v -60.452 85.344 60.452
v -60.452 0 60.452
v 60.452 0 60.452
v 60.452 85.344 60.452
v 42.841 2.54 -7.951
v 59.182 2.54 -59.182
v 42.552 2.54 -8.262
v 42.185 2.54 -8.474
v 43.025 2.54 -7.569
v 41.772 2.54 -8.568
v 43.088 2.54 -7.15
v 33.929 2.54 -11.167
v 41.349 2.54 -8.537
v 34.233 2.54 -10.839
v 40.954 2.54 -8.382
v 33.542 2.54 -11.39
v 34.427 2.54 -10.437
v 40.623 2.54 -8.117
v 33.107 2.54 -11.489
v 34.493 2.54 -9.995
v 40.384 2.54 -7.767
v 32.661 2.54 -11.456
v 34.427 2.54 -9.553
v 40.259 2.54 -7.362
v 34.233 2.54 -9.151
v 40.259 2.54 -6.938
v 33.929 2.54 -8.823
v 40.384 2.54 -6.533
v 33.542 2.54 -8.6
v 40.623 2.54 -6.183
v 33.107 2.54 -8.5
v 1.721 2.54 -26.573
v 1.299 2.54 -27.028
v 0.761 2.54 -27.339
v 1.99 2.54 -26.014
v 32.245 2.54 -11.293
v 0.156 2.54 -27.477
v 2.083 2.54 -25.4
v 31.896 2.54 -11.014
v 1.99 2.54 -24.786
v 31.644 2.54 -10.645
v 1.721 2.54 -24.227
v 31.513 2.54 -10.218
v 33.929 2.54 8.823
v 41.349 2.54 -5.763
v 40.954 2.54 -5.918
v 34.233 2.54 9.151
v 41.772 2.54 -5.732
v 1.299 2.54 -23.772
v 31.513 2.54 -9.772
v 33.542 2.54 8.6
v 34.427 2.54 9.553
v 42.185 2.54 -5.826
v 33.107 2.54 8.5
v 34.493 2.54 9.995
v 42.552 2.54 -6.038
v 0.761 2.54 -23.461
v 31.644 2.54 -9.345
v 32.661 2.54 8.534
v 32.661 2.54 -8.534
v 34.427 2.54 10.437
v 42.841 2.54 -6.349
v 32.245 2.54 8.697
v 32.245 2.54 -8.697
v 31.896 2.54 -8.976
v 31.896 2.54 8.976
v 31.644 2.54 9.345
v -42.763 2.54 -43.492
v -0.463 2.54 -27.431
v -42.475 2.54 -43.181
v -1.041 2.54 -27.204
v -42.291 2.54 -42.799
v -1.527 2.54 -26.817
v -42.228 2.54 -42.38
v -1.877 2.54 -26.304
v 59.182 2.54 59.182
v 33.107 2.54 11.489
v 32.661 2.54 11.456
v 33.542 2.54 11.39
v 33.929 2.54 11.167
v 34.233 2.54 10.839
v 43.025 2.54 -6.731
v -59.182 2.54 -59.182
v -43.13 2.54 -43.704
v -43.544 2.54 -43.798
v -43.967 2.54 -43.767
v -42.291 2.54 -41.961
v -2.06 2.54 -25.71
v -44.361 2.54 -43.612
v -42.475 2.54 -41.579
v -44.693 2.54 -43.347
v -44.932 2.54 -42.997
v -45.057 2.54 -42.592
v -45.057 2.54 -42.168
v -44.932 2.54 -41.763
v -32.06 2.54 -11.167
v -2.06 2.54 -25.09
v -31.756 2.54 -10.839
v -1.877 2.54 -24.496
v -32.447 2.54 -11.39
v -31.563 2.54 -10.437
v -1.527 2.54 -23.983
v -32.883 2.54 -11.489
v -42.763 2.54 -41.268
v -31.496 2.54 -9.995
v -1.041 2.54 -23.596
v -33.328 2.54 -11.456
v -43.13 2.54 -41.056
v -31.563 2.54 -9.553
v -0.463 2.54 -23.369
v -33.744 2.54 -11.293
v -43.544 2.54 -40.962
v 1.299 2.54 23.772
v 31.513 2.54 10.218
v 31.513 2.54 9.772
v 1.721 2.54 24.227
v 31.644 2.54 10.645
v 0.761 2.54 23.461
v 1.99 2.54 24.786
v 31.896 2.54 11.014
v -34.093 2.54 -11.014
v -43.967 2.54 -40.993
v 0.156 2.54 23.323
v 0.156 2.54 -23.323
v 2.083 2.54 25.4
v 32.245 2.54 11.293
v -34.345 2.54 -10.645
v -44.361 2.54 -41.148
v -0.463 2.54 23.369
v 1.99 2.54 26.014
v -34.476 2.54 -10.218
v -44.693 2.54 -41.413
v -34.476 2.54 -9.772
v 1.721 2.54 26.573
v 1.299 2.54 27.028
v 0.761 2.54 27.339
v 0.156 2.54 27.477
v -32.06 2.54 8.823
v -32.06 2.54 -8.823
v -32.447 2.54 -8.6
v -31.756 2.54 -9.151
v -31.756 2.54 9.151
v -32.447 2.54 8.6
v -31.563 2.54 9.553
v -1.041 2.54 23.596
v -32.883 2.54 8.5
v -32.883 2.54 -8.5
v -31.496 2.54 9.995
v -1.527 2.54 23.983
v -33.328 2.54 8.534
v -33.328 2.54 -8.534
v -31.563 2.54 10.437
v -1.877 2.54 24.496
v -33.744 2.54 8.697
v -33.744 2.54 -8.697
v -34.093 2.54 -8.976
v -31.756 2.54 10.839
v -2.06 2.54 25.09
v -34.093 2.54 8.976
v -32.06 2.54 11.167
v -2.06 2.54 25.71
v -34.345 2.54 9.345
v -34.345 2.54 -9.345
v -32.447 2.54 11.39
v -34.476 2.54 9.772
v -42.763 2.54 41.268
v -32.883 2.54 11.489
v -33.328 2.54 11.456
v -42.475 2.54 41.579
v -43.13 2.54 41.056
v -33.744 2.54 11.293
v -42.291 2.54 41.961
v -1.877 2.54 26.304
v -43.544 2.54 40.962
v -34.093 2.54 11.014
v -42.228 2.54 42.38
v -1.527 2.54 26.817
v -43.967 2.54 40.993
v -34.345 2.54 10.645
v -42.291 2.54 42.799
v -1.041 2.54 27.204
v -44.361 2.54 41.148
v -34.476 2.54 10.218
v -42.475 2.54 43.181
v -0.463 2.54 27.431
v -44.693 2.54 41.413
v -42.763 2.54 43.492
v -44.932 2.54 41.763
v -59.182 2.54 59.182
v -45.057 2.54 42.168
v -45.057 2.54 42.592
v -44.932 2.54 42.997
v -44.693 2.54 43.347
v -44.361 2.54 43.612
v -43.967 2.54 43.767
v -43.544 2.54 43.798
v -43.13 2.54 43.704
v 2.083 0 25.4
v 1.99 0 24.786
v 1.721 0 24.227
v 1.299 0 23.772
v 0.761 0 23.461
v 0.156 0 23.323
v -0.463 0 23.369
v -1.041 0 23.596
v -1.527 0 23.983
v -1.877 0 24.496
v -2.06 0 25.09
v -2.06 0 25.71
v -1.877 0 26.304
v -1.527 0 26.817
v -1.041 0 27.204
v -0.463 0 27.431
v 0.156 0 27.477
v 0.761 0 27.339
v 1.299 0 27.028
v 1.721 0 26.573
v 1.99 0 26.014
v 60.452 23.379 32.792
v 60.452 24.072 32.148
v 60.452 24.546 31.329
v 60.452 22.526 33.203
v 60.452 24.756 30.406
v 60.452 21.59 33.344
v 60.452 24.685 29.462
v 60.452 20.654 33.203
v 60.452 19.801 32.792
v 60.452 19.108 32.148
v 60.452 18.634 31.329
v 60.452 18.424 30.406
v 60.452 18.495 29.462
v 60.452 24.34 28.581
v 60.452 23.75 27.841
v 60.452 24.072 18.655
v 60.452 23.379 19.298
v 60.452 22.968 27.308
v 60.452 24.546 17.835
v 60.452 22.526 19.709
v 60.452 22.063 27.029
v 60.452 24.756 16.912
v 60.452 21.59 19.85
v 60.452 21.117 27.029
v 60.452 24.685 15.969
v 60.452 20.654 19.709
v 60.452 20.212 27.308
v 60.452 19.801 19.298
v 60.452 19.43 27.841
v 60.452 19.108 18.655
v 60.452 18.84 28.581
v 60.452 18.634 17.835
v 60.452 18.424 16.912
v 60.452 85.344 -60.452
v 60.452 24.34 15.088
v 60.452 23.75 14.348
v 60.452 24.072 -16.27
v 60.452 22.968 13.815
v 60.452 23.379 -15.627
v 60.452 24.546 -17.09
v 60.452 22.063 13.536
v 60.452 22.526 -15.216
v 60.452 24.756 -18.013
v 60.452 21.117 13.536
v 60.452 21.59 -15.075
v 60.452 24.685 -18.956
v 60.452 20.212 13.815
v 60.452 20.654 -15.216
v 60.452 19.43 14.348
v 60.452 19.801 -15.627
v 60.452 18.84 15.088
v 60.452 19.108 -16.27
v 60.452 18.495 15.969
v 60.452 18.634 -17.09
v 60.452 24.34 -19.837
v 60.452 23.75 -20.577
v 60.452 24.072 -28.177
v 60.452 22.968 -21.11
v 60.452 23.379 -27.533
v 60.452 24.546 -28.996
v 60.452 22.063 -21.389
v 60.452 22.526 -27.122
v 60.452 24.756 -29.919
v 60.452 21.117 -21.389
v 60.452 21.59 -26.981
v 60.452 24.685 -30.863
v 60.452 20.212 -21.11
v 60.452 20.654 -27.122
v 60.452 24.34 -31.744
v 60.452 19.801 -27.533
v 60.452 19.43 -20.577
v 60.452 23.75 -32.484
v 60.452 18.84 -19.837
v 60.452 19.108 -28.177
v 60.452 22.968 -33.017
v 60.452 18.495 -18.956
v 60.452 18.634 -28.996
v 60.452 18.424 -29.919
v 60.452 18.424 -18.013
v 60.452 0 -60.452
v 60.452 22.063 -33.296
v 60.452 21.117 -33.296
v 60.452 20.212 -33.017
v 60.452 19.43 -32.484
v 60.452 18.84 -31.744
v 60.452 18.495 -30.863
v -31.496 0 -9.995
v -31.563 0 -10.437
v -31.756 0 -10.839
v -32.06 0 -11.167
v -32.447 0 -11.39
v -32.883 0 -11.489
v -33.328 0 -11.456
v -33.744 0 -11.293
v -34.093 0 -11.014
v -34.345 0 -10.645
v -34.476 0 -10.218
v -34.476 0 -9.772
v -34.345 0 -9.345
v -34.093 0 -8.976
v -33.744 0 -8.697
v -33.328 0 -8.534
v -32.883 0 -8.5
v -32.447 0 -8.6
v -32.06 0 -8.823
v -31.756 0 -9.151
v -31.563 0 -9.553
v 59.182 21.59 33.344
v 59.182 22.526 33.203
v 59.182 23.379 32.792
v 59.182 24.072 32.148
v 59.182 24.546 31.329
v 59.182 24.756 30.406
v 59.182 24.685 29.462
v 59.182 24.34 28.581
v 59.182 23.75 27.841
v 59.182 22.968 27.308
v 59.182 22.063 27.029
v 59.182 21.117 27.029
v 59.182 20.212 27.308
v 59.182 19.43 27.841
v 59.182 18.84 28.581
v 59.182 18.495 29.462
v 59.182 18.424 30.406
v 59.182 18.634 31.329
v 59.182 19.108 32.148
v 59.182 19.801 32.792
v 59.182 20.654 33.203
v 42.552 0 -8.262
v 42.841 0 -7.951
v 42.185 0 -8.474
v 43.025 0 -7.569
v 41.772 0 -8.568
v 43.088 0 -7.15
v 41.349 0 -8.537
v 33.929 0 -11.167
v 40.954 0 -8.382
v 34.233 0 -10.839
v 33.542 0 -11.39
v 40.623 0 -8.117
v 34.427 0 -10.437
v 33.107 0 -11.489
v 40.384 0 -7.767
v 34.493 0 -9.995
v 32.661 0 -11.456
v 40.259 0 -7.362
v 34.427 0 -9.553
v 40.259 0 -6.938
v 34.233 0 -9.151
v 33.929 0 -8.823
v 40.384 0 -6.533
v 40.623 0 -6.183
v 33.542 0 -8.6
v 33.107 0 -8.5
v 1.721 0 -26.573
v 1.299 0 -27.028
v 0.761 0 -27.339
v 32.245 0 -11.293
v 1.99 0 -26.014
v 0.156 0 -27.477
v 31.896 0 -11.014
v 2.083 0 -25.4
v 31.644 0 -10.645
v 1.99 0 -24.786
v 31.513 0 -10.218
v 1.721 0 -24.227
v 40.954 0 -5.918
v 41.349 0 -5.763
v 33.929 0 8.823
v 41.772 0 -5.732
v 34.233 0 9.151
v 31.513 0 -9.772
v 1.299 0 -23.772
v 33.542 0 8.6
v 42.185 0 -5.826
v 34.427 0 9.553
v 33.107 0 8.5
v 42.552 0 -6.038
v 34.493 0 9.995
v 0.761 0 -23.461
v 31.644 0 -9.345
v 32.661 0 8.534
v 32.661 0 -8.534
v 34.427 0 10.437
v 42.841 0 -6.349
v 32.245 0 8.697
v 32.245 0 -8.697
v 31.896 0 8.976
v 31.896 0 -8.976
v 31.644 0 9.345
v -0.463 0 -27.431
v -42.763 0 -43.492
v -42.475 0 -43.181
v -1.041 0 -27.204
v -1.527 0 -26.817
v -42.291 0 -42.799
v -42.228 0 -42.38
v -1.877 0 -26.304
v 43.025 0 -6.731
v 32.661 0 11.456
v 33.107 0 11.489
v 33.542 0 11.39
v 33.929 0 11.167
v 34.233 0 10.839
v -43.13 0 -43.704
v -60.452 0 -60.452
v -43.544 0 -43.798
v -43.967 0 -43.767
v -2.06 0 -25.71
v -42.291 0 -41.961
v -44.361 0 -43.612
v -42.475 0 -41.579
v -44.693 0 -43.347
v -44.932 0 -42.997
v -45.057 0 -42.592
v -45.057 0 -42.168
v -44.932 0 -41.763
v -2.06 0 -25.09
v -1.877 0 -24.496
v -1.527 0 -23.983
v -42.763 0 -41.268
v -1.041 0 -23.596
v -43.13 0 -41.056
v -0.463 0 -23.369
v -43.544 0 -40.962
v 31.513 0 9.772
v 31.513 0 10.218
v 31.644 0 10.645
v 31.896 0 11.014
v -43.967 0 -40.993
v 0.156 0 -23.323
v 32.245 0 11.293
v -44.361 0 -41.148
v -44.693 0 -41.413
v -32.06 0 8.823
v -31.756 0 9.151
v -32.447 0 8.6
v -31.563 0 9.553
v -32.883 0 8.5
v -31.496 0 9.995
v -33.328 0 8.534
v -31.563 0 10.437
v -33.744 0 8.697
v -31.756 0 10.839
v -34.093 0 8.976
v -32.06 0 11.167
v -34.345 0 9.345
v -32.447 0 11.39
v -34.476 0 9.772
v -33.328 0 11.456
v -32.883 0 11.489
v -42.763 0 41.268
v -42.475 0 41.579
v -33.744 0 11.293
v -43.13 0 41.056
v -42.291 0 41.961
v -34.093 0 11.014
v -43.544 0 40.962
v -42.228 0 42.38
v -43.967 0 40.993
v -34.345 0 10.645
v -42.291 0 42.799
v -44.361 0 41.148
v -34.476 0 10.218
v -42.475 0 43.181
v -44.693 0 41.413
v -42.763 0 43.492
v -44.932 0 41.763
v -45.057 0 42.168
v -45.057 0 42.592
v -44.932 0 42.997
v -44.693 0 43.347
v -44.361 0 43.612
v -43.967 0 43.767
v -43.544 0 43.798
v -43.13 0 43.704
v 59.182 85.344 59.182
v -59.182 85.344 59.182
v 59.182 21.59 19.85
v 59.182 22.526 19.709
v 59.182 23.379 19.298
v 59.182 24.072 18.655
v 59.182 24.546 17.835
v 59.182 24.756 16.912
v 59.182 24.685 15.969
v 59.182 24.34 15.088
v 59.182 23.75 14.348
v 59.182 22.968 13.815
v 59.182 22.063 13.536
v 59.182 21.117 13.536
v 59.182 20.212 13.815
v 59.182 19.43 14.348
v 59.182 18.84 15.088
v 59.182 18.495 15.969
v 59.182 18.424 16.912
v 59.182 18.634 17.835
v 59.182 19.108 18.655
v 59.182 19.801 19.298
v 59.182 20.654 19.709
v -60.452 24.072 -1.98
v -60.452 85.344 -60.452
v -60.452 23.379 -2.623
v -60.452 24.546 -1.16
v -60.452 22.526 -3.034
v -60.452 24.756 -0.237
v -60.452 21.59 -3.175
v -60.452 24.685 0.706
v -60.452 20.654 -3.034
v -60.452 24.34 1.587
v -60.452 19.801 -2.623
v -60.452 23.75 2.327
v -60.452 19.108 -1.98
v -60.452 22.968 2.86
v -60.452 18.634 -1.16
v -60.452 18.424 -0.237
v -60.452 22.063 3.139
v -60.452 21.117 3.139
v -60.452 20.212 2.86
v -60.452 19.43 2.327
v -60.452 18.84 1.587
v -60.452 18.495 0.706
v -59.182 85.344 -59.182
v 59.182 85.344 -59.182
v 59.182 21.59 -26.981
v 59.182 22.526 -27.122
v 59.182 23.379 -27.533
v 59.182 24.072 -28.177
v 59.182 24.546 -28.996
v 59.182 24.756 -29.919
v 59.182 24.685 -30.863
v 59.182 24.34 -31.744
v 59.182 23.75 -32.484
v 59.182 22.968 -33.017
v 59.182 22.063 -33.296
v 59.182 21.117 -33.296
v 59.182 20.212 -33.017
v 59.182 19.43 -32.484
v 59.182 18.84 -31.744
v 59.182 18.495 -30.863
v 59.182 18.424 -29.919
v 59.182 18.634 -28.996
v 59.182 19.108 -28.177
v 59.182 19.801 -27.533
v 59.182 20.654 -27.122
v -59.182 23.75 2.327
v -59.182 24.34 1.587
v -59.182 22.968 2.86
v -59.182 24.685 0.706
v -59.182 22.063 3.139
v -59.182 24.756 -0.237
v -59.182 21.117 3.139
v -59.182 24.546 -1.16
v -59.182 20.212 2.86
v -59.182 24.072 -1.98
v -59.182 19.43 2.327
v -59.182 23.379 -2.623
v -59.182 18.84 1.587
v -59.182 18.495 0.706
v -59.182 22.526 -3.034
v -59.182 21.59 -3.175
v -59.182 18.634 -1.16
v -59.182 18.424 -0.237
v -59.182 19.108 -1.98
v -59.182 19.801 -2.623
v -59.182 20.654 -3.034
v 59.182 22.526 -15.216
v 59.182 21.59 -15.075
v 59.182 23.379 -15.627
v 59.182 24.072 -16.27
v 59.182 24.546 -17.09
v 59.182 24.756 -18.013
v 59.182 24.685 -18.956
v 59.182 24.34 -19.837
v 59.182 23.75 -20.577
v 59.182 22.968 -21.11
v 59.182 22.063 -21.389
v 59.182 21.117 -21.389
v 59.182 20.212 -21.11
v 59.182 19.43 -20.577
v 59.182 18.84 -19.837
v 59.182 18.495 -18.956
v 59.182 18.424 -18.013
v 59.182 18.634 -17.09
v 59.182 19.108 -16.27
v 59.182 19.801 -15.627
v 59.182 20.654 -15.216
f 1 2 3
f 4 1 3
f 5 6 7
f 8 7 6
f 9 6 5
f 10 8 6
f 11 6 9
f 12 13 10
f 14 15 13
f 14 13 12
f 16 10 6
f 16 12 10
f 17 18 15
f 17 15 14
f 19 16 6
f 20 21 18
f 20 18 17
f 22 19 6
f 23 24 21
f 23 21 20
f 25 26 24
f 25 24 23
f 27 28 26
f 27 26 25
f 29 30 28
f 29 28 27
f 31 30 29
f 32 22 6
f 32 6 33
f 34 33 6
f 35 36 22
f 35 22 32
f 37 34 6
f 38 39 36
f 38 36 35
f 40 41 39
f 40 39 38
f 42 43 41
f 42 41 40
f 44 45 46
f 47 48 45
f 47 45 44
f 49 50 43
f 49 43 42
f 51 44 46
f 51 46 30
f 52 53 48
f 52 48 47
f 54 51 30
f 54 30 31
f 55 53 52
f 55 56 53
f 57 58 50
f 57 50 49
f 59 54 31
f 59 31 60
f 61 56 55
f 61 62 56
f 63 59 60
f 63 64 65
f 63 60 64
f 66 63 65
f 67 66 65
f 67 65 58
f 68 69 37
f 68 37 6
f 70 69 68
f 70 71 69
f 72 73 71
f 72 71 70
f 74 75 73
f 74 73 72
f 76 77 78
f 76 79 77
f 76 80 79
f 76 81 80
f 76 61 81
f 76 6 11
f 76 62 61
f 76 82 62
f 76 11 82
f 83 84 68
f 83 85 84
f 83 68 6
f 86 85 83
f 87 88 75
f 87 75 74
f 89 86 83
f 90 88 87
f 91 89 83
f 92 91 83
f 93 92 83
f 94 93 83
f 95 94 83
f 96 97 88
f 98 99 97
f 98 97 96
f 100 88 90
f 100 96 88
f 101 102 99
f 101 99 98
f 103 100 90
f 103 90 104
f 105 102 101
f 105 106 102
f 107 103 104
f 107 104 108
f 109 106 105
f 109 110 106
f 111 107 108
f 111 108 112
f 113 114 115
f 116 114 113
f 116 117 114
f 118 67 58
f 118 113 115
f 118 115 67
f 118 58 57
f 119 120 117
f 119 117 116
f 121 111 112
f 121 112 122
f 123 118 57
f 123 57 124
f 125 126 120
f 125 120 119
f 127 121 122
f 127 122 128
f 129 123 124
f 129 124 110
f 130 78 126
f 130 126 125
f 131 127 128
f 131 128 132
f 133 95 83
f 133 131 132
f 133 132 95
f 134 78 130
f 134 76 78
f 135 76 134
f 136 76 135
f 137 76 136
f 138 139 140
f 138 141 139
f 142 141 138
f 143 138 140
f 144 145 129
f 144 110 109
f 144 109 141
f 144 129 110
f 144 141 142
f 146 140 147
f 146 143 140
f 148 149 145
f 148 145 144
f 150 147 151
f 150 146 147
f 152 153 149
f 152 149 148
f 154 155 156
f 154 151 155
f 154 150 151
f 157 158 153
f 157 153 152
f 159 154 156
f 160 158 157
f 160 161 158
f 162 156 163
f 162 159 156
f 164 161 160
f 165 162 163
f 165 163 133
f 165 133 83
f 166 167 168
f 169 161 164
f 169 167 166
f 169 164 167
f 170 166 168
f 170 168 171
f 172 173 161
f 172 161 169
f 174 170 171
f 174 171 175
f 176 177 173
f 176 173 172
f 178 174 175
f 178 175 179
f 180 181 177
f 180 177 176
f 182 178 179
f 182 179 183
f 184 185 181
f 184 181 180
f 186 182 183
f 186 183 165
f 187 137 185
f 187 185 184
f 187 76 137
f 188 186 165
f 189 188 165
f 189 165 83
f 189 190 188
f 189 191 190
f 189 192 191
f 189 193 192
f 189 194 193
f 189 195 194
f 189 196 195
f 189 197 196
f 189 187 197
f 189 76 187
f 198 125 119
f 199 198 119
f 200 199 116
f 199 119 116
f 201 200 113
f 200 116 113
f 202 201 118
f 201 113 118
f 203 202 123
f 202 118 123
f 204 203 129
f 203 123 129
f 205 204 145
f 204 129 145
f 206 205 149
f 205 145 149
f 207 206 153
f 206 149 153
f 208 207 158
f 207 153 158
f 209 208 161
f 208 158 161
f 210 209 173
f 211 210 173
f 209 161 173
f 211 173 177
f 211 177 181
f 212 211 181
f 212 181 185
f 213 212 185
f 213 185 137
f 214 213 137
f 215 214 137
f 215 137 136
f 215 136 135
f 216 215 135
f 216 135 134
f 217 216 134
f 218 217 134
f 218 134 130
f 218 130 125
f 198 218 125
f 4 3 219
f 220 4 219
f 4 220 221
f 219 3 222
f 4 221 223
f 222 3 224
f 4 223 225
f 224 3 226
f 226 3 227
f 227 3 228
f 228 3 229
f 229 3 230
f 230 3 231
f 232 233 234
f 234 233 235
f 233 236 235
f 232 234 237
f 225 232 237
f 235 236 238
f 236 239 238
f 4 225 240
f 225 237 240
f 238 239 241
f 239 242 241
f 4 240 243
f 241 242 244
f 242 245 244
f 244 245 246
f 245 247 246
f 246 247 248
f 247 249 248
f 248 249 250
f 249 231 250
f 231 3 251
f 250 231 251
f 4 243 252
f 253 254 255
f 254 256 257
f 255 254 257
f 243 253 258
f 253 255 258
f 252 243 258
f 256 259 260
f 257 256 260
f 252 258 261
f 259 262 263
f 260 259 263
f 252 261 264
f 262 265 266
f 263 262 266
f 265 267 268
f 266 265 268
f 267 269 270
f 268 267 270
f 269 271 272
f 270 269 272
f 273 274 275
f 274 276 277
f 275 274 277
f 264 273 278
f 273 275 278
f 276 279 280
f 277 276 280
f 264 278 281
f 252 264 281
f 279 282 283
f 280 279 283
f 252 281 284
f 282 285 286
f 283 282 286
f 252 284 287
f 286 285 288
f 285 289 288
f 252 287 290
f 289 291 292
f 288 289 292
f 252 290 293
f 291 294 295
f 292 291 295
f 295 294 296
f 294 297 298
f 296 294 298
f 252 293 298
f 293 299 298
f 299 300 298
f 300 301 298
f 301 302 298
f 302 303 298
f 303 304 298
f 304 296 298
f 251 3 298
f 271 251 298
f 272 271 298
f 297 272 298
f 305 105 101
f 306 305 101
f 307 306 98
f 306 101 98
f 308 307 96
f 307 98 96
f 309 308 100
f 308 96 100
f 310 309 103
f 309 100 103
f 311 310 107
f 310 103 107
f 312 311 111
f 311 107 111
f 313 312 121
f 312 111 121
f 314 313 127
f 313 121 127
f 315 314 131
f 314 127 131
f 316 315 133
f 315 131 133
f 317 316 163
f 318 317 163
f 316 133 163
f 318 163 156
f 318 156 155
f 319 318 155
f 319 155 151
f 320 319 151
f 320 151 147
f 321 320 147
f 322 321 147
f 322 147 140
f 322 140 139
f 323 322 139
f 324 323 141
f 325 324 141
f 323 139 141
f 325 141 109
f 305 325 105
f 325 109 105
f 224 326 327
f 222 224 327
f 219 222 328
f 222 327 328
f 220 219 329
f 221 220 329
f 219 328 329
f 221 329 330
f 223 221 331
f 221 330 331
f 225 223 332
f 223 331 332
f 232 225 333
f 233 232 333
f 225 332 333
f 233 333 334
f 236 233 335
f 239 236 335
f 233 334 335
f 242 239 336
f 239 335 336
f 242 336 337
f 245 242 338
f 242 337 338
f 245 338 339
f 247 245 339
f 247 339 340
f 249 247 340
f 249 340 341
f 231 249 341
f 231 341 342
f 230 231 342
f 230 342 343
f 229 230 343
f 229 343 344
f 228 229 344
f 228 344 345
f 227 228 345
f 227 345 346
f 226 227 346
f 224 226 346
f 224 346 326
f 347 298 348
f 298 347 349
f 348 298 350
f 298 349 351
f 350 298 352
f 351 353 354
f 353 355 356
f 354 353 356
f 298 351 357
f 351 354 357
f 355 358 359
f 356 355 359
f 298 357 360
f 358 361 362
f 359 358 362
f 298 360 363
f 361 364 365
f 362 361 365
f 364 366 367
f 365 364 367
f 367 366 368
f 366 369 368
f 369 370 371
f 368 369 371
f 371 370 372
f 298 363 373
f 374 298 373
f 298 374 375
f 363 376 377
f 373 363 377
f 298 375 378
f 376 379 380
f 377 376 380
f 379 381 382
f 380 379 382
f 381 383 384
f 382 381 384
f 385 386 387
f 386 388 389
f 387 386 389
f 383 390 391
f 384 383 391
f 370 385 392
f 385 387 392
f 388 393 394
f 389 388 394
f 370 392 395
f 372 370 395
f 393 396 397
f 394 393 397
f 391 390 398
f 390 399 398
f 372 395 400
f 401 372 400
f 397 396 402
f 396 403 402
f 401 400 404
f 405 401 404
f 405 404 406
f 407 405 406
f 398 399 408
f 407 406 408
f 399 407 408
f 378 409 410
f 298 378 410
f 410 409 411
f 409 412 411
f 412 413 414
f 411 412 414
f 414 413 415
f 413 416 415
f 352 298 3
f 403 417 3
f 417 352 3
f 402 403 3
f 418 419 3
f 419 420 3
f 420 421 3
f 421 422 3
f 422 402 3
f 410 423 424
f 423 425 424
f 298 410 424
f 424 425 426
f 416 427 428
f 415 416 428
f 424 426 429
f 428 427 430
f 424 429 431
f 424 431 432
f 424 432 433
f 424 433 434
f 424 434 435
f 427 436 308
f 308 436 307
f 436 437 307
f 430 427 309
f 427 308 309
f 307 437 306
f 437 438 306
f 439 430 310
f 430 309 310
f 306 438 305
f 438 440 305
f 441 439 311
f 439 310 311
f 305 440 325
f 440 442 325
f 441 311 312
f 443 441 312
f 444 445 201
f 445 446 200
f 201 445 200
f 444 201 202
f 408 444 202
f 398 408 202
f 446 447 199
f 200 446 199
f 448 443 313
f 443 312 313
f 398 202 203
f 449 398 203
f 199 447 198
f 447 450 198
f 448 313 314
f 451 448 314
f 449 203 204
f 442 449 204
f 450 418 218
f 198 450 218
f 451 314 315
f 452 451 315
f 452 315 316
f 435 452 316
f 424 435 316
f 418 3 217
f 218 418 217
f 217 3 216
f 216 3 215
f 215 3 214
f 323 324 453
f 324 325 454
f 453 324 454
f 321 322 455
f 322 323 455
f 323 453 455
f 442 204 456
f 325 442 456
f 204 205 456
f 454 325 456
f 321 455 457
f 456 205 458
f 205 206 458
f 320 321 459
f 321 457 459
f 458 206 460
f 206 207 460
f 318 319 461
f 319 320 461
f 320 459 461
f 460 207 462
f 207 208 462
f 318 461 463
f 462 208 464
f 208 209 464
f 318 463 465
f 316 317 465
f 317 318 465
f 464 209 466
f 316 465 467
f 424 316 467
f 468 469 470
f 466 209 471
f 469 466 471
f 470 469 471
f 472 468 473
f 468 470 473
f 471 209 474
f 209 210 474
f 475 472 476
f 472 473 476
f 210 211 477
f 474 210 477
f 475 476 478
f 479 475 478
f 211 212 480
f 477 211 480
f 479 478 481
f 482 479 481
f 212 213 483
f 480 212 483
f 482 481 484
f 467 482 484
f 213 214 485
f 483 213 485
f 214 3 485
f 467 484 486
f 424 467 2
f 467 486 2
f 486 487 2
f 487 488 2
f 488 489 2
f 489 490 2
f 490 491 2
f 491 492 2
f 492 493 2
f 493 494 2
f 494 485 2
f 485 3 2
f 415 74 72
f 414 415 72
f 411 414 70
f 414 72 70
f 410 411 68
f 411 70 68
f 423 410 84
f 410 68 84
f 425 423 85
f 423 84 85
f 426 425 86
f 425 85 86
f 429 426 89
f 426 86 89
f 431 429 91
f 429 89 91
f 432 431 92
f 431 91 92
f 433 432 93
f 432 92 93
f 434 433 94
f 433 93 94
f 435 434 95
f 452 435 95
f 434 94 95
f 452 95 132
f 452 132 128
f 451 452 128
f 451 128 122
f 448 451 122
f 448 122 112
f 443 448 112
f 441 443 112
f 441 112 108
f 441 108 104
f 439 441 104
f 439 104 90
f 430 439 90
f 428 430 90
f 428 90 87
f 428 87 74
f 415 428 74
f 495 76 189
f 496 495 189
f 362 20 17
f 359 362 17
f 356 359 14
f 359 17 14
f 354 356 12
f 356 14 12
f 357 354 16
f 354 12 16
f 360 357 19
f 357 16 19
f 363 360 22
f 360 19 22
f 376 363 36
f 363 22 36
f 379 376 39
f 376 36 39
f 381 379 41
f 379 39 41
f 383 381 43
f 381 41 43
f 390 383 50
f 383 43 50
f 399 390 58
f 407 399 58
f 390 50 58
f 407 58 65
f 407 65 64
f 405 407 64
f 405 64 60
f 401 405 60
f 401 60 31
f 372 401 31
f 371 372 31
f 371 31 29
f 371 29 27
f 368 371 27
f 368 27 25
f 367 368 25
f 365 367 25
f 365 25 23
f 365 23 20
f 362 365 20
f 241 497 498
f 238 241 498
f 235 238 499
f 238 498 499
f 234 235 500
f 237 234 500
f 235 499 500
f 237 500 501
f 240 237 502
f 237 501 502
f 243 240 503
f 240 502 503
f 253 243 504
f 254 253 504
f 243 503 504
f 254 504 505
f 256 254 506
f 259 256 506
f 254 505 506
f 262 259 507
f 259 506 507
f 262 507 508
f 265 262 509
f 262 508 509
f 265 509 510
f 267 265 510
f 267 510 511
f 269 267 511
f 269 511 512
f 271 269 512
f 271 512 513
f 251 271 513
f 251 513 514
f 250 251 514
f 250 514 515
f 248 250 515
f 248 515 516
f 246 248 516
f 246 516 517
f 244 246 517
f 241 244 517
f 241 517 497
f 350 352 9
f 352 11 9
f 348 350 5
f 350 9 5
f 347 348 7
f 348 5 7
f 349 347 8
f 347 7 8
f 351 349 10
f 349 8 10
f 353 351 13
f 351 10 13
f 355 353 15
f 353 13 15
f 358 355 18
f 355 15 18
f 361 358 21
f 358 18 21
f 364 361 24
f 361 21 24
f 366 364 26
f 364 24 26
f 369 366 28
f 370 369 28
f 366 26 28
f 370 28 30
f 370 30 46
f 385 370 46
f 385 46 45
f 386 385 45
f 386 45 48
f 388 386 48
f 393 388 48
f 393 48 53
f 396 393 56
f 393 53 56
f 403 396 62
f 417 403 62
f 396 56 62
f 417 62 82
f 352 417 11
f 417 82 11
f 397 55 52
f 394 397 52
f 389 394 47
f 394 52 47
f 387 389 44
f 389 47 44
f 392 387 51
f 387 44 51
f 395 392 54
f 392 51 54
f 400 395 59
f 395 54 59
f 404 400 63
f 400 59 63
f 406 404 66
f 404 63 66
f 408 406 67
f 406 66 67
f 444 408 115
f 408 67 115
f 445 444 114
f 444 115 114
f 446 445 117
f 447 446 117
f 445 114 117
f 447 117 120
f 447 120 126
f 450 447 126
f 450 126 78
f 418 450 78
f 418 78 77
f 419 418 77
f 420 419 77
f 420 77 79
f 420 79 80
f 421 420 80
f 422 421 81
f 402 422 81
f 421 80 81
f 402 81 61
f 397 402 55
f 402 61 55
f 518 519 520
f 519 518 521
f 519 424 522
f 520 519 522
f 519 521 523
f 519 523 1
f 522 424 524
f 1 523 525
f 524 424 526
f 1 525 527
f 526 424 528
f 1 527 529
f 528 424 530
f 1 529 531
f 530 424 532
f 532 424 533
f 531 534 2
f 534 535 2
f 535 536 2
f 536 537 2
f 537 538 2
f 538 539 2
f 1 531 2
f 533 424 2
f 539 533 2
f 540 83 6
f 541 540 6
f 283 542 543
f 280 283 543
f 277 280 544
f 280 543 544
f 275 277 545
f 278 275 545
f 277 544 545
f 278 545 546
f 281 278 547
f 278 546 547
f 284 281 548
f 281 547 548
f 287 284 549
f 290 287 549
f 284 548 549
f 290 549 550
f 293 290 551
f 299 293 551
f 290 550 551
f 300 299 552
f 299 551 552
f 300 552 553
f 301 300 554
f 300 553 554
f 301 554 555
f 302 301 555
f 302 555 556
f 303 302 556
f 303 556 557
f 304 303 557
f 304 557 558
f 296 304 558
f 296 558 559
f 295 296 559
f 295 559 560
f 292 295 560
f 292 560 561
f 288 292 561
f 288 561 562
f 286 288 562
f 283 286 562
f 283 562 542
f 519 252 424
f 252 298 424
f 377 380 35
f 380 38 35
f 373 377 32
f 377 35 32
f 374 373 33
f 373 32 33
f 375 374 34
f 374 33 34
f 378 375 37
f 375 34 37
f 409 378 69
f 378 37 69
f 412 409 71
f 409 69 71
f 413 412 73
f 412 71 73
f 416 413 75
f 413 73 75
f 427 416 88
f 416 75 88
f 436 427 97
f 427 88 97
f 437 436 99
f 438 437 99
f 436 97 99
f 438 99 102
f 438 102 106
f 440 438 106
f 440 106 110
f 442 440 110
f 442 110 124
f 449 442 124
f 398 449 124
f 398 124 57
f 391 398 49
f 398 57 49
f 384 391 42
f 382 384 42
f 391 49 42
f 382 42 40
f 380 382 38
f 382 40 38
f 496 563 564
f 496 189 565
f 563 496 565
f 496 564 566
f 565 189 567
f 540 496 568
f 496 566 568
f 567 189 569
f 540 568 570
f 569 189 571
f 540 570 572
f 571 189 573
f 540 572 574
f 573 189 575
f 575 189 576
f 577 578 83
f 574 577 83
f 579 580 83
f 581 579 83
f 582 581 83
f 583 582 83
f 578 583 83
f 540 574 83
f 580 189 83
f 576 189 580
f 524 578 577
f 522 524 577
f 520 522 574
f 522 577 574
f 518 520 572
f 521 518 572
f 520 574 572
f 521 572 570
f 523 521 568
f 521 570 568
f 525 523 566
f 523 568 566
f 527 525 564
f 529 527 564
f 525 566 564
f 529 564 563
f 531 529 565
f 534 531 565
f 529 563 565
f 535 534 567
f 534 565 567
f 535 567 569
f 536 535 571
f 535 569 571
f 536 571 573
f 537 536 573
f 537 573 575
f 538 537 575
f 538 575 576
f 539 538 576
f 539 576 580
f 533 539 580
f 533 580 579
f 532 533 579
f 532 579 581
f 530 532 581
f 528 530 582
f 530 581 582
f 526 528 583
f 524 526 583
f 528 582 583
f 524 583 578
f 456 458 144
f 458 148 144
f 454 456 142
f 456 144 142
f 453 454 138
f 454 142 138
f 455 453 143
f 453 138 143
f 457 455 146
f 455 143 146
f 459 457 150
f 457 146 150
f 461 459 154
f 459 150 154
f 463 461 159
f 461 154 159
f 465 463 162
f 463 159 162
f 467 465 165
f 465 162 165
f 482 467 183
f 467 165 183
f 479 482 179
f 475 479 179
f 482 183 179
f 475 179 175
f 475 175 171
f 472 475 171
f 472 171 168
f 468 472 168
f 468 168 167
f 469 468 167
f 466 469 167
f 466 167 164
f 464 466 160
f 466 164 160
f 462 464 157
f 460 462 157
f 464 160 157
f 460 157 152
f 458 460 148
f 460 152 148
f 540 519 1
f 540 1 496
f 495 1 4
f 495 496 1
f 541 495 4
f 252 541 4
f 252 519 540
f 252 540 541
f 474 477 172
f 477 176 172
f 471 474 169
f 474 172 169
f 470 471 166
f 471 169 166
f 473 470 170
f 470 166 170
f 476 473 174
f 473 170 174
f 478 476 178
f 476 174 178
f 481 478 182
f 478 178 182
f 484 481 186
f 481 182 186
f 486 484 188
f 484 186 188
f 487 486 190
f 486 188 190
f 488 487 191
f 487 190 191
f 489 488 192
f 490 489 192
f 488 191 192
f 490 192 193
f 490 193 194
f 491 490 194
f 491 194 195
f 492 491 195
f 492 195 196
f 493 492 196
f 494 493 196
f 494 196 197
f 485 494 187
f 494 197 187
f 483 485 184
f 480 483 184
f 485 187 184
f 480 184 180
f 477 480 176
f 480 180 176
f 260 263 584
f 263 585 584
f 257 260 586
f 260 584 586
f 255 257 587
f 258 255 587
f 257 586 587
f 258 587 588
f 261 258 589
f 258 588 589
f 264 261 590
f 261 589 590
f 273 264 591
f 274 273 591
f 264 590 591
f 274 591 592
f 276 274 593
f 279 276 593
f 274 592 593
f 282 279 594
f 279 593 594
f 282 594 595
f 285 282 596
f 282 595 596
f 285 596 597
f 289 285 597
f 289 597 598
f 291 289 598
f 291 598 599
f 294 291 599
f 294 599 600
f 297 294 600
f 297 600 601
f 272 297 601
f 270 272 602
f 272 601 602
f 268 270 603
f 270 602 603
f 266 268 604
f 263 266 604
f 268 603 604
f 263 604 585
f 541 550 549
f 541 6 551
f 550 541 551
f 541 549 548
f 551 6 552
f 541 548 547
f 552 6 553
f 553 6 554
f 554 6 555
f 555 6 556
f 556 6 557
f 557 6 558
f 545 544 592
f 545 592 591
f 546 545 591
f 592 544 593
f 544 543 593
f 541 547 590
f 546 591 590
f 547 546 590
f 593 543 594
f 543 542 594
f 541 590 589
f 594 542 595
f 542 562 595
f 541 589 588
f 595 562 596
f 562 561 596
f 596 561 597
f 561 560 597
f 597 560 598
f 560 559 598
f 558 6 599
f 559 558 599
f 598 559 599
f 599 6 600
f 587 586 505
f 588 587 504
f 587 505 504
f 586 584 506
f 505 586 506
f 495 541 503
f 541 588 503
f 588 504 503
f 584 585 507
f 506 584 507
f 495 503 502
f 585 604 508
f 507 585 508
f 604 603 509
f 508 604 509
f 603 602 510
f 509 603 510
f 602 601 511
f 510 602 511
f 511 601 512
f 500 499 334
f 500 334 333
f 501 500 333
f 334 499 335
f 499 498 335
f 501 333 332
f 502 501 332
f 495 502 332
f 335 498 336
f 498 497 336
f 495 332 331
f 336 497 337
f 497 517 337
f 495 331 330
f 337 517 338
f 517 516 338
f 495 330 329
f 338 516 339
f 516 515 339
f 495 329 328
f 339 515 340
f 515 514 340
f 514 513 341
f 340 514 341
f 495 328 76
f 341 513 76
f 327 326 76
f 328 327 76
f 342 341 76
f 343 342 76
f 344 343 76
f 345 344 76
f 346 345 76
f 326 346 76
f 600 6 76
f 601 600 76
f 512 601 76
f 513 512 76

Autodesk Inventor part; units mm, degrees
ref_plane "YZ Plane" through (0, 0, 0) normal (1, 0, 0) x (0, 1, 0)
ref_plane "XZ Plane" through (0, 0, 0) normal (0, 1, 0) x (-1, 0, 0)
ref_plane "XY Plane" through (0, 0, 0) normal (0, 0, 1) x (1, 0, 0)
sketch "Sketch1" plane through (0, 0, 0) normal (0, 1, 0) x (-1, 0, 0)
  line L0 (-60.452, -60.452) -> (60.452, -60.452)
  line L1 (60.452, -60.452) -> (60.452, 60.452)
  line L2 (60.452, 60.452) -> (-60.452, 60.452)
  line L3 (-60.452, 60.452) -> (-60.452, -60.452)
  line L4 (-60.452, -60.452) -> (60.452, 60.452) construction
  line L5 (60.452, -60.452) -> (-60.452, 60.452) construction
  point P0 (0, 0)
  dimension "d0" = 120.904
  dimension "d1" = 120.904
extrude "Extrusion1" add sketch "Sketch1" along normal blind 2.54
sketch "Sketch2" plane through (0, 2.54, 0) normal (0, 1, 0) x (1, 0, 0)
  line L0 (60.452, 60.452) -> (-60.452, 60.452) projected
  line L1 (60.452, -60.452) -> (-60.452, -60.452)
  line L2 (-60.452, -60.452) -> (-60.452, 60.452)
  line L3 (-60.452, 60.452) -> (60.452, 60.452)
  line L4 (60.452, 60.452) -> (60.452, -60.452)
  line L5 (60.452, -60.452) -> (-60.452, 60.452) construction
  line L6 (-60.452, -60.452) -> (60.452, 60.452) construction
  line L7 (59.182, -59.182) -> (-59.182, -59.182)
  line L8 (-59.182, -59.182) -> (-59.182, 59.182)
  line L9 (-59.182, 59.182) -> (59.182, 59.182)
  line L10 (59.182, 59.182) -> (59.182, -59.182)
  line L11 (59.182, -59.182) -> (-59.182, 59.182) construction
  line L12 (-59.182, -59.182) -> (59.182, 59.182) construction
  point P0 (0, 0)
  dimension "d4" = 118.364
  dimension "d5" = 118.364
extrude "Extrusion2" add sketch "Sketch2" along normal blind 82.804
sketch "Sketch3" plane through (0, 2.54, 0) normal (0, 1, 0) x (1, 0, 0)
  circle A0 centre (0, -25.4) radius 2.0828
  circle A1 centre (0, 25.4) radius 2.0828
  point P0 (0, 0)
  dimension "d10" = 4.1656
  dimension "d11" = 4.1656
extrude "Extrusion3" cut sketch "Sketch3" against normal through all
sketch "Sketch4" plane through (0, 2.54, 0) normal (0, 1, 0) x (1, 0, 0)
  line L0 (50, -50) -> (-50, 50) construction
  line L1 (-50, -50) -> (50, 50) construction
  circle A0 centre (41.6656, 7.15) radius 1.4224
  circle A1 centre (-43.65, -42.38) radius 1.4224
  circle A2 centre (-43.65, 42.38) radius 1.4224
  line L2 (32.9946, -9.9949) -> (-32.9946, 9.9949) construction
  line L3 (-32.9946, -9.9949) -> (32.9946, 9.9949) construction
  circle A3 centre (-32.9946, -9.9949) radius 1.4986
  circle A4 centre (-32.9946, 9.9949) radius 1.4986
  circle A5 centre (32.9946, 9.9949) radius 1.4986
  circle A6 centre (32.9946, -9.9949) radius 1.4986
  point P0 (0, 0)
  dimension "d14" = 100
  dimension "d15" = 100
  dimension "d21" = 2.8448
  dimension "d22" = 2.8448
  dimension "d23" = 2.8448
  dimension "d24" = 65.9892
  dimension "d25" = 19.9898
  dimension "d26" = 2.9972
  dimension "d27" = 2.9972
  dimension "d28" = 2.9972
  dimension "d29" = 2.9972
extrude "Extrusion4" cut sketch "Sketch4" against normal through all
sketch "Sketch5" plane through (-59.182, 2.54, 59.182) normal (1, 0, 0) x (0, 0, -1)
  line L0 (0, 0) -> (0, 82.804) projected
  line L1 (0, 19.05) -> (9.1821, 19.05) construction
  circle A0 centre (59.1821, 19.05) radius 3.175
  point P0 (59.182, -2.54)
  dimension "d35" = 6.35
extrude "Extrusion5" cut sketch "Sketch5" against normal through all
sketch "Sketch6" plane through (59.182, 2.54, -59.182) normal (-1, 0, 0) x (0, 0, 1)
  point P0 (59.182, -2.54)
sketch "Sketch7" plane through (59.182, 2.54, -59.182) normal (-1, 0, 0) x (0, 0, 1)
  line L0 (0, 0) -> (0, 82.804) projected
  line L1 (0, 19.05) -> (9.1821, 19.05) construction
  circle A0 centre (29.0259, 19.05) radius 3.175
  circle A1 centre (40.9321, 19.05) radius 3.175
  circle A2 centre (75.8571, 19.05) radius 3.175
  circle A3 centre (89.3509, 19.05) radius 3.175
  point P0 (59.182, -2.54)
  dimension "d44" = 6.35
  dimension "d45" = 6.35
  dimension "d46" = 6.35
  dimension "d47" = 6.35
extrude "Extrusion6" cut sketch "Sketch7" against normal through all
properties part number "546-1550Z137-4xSplitter"
